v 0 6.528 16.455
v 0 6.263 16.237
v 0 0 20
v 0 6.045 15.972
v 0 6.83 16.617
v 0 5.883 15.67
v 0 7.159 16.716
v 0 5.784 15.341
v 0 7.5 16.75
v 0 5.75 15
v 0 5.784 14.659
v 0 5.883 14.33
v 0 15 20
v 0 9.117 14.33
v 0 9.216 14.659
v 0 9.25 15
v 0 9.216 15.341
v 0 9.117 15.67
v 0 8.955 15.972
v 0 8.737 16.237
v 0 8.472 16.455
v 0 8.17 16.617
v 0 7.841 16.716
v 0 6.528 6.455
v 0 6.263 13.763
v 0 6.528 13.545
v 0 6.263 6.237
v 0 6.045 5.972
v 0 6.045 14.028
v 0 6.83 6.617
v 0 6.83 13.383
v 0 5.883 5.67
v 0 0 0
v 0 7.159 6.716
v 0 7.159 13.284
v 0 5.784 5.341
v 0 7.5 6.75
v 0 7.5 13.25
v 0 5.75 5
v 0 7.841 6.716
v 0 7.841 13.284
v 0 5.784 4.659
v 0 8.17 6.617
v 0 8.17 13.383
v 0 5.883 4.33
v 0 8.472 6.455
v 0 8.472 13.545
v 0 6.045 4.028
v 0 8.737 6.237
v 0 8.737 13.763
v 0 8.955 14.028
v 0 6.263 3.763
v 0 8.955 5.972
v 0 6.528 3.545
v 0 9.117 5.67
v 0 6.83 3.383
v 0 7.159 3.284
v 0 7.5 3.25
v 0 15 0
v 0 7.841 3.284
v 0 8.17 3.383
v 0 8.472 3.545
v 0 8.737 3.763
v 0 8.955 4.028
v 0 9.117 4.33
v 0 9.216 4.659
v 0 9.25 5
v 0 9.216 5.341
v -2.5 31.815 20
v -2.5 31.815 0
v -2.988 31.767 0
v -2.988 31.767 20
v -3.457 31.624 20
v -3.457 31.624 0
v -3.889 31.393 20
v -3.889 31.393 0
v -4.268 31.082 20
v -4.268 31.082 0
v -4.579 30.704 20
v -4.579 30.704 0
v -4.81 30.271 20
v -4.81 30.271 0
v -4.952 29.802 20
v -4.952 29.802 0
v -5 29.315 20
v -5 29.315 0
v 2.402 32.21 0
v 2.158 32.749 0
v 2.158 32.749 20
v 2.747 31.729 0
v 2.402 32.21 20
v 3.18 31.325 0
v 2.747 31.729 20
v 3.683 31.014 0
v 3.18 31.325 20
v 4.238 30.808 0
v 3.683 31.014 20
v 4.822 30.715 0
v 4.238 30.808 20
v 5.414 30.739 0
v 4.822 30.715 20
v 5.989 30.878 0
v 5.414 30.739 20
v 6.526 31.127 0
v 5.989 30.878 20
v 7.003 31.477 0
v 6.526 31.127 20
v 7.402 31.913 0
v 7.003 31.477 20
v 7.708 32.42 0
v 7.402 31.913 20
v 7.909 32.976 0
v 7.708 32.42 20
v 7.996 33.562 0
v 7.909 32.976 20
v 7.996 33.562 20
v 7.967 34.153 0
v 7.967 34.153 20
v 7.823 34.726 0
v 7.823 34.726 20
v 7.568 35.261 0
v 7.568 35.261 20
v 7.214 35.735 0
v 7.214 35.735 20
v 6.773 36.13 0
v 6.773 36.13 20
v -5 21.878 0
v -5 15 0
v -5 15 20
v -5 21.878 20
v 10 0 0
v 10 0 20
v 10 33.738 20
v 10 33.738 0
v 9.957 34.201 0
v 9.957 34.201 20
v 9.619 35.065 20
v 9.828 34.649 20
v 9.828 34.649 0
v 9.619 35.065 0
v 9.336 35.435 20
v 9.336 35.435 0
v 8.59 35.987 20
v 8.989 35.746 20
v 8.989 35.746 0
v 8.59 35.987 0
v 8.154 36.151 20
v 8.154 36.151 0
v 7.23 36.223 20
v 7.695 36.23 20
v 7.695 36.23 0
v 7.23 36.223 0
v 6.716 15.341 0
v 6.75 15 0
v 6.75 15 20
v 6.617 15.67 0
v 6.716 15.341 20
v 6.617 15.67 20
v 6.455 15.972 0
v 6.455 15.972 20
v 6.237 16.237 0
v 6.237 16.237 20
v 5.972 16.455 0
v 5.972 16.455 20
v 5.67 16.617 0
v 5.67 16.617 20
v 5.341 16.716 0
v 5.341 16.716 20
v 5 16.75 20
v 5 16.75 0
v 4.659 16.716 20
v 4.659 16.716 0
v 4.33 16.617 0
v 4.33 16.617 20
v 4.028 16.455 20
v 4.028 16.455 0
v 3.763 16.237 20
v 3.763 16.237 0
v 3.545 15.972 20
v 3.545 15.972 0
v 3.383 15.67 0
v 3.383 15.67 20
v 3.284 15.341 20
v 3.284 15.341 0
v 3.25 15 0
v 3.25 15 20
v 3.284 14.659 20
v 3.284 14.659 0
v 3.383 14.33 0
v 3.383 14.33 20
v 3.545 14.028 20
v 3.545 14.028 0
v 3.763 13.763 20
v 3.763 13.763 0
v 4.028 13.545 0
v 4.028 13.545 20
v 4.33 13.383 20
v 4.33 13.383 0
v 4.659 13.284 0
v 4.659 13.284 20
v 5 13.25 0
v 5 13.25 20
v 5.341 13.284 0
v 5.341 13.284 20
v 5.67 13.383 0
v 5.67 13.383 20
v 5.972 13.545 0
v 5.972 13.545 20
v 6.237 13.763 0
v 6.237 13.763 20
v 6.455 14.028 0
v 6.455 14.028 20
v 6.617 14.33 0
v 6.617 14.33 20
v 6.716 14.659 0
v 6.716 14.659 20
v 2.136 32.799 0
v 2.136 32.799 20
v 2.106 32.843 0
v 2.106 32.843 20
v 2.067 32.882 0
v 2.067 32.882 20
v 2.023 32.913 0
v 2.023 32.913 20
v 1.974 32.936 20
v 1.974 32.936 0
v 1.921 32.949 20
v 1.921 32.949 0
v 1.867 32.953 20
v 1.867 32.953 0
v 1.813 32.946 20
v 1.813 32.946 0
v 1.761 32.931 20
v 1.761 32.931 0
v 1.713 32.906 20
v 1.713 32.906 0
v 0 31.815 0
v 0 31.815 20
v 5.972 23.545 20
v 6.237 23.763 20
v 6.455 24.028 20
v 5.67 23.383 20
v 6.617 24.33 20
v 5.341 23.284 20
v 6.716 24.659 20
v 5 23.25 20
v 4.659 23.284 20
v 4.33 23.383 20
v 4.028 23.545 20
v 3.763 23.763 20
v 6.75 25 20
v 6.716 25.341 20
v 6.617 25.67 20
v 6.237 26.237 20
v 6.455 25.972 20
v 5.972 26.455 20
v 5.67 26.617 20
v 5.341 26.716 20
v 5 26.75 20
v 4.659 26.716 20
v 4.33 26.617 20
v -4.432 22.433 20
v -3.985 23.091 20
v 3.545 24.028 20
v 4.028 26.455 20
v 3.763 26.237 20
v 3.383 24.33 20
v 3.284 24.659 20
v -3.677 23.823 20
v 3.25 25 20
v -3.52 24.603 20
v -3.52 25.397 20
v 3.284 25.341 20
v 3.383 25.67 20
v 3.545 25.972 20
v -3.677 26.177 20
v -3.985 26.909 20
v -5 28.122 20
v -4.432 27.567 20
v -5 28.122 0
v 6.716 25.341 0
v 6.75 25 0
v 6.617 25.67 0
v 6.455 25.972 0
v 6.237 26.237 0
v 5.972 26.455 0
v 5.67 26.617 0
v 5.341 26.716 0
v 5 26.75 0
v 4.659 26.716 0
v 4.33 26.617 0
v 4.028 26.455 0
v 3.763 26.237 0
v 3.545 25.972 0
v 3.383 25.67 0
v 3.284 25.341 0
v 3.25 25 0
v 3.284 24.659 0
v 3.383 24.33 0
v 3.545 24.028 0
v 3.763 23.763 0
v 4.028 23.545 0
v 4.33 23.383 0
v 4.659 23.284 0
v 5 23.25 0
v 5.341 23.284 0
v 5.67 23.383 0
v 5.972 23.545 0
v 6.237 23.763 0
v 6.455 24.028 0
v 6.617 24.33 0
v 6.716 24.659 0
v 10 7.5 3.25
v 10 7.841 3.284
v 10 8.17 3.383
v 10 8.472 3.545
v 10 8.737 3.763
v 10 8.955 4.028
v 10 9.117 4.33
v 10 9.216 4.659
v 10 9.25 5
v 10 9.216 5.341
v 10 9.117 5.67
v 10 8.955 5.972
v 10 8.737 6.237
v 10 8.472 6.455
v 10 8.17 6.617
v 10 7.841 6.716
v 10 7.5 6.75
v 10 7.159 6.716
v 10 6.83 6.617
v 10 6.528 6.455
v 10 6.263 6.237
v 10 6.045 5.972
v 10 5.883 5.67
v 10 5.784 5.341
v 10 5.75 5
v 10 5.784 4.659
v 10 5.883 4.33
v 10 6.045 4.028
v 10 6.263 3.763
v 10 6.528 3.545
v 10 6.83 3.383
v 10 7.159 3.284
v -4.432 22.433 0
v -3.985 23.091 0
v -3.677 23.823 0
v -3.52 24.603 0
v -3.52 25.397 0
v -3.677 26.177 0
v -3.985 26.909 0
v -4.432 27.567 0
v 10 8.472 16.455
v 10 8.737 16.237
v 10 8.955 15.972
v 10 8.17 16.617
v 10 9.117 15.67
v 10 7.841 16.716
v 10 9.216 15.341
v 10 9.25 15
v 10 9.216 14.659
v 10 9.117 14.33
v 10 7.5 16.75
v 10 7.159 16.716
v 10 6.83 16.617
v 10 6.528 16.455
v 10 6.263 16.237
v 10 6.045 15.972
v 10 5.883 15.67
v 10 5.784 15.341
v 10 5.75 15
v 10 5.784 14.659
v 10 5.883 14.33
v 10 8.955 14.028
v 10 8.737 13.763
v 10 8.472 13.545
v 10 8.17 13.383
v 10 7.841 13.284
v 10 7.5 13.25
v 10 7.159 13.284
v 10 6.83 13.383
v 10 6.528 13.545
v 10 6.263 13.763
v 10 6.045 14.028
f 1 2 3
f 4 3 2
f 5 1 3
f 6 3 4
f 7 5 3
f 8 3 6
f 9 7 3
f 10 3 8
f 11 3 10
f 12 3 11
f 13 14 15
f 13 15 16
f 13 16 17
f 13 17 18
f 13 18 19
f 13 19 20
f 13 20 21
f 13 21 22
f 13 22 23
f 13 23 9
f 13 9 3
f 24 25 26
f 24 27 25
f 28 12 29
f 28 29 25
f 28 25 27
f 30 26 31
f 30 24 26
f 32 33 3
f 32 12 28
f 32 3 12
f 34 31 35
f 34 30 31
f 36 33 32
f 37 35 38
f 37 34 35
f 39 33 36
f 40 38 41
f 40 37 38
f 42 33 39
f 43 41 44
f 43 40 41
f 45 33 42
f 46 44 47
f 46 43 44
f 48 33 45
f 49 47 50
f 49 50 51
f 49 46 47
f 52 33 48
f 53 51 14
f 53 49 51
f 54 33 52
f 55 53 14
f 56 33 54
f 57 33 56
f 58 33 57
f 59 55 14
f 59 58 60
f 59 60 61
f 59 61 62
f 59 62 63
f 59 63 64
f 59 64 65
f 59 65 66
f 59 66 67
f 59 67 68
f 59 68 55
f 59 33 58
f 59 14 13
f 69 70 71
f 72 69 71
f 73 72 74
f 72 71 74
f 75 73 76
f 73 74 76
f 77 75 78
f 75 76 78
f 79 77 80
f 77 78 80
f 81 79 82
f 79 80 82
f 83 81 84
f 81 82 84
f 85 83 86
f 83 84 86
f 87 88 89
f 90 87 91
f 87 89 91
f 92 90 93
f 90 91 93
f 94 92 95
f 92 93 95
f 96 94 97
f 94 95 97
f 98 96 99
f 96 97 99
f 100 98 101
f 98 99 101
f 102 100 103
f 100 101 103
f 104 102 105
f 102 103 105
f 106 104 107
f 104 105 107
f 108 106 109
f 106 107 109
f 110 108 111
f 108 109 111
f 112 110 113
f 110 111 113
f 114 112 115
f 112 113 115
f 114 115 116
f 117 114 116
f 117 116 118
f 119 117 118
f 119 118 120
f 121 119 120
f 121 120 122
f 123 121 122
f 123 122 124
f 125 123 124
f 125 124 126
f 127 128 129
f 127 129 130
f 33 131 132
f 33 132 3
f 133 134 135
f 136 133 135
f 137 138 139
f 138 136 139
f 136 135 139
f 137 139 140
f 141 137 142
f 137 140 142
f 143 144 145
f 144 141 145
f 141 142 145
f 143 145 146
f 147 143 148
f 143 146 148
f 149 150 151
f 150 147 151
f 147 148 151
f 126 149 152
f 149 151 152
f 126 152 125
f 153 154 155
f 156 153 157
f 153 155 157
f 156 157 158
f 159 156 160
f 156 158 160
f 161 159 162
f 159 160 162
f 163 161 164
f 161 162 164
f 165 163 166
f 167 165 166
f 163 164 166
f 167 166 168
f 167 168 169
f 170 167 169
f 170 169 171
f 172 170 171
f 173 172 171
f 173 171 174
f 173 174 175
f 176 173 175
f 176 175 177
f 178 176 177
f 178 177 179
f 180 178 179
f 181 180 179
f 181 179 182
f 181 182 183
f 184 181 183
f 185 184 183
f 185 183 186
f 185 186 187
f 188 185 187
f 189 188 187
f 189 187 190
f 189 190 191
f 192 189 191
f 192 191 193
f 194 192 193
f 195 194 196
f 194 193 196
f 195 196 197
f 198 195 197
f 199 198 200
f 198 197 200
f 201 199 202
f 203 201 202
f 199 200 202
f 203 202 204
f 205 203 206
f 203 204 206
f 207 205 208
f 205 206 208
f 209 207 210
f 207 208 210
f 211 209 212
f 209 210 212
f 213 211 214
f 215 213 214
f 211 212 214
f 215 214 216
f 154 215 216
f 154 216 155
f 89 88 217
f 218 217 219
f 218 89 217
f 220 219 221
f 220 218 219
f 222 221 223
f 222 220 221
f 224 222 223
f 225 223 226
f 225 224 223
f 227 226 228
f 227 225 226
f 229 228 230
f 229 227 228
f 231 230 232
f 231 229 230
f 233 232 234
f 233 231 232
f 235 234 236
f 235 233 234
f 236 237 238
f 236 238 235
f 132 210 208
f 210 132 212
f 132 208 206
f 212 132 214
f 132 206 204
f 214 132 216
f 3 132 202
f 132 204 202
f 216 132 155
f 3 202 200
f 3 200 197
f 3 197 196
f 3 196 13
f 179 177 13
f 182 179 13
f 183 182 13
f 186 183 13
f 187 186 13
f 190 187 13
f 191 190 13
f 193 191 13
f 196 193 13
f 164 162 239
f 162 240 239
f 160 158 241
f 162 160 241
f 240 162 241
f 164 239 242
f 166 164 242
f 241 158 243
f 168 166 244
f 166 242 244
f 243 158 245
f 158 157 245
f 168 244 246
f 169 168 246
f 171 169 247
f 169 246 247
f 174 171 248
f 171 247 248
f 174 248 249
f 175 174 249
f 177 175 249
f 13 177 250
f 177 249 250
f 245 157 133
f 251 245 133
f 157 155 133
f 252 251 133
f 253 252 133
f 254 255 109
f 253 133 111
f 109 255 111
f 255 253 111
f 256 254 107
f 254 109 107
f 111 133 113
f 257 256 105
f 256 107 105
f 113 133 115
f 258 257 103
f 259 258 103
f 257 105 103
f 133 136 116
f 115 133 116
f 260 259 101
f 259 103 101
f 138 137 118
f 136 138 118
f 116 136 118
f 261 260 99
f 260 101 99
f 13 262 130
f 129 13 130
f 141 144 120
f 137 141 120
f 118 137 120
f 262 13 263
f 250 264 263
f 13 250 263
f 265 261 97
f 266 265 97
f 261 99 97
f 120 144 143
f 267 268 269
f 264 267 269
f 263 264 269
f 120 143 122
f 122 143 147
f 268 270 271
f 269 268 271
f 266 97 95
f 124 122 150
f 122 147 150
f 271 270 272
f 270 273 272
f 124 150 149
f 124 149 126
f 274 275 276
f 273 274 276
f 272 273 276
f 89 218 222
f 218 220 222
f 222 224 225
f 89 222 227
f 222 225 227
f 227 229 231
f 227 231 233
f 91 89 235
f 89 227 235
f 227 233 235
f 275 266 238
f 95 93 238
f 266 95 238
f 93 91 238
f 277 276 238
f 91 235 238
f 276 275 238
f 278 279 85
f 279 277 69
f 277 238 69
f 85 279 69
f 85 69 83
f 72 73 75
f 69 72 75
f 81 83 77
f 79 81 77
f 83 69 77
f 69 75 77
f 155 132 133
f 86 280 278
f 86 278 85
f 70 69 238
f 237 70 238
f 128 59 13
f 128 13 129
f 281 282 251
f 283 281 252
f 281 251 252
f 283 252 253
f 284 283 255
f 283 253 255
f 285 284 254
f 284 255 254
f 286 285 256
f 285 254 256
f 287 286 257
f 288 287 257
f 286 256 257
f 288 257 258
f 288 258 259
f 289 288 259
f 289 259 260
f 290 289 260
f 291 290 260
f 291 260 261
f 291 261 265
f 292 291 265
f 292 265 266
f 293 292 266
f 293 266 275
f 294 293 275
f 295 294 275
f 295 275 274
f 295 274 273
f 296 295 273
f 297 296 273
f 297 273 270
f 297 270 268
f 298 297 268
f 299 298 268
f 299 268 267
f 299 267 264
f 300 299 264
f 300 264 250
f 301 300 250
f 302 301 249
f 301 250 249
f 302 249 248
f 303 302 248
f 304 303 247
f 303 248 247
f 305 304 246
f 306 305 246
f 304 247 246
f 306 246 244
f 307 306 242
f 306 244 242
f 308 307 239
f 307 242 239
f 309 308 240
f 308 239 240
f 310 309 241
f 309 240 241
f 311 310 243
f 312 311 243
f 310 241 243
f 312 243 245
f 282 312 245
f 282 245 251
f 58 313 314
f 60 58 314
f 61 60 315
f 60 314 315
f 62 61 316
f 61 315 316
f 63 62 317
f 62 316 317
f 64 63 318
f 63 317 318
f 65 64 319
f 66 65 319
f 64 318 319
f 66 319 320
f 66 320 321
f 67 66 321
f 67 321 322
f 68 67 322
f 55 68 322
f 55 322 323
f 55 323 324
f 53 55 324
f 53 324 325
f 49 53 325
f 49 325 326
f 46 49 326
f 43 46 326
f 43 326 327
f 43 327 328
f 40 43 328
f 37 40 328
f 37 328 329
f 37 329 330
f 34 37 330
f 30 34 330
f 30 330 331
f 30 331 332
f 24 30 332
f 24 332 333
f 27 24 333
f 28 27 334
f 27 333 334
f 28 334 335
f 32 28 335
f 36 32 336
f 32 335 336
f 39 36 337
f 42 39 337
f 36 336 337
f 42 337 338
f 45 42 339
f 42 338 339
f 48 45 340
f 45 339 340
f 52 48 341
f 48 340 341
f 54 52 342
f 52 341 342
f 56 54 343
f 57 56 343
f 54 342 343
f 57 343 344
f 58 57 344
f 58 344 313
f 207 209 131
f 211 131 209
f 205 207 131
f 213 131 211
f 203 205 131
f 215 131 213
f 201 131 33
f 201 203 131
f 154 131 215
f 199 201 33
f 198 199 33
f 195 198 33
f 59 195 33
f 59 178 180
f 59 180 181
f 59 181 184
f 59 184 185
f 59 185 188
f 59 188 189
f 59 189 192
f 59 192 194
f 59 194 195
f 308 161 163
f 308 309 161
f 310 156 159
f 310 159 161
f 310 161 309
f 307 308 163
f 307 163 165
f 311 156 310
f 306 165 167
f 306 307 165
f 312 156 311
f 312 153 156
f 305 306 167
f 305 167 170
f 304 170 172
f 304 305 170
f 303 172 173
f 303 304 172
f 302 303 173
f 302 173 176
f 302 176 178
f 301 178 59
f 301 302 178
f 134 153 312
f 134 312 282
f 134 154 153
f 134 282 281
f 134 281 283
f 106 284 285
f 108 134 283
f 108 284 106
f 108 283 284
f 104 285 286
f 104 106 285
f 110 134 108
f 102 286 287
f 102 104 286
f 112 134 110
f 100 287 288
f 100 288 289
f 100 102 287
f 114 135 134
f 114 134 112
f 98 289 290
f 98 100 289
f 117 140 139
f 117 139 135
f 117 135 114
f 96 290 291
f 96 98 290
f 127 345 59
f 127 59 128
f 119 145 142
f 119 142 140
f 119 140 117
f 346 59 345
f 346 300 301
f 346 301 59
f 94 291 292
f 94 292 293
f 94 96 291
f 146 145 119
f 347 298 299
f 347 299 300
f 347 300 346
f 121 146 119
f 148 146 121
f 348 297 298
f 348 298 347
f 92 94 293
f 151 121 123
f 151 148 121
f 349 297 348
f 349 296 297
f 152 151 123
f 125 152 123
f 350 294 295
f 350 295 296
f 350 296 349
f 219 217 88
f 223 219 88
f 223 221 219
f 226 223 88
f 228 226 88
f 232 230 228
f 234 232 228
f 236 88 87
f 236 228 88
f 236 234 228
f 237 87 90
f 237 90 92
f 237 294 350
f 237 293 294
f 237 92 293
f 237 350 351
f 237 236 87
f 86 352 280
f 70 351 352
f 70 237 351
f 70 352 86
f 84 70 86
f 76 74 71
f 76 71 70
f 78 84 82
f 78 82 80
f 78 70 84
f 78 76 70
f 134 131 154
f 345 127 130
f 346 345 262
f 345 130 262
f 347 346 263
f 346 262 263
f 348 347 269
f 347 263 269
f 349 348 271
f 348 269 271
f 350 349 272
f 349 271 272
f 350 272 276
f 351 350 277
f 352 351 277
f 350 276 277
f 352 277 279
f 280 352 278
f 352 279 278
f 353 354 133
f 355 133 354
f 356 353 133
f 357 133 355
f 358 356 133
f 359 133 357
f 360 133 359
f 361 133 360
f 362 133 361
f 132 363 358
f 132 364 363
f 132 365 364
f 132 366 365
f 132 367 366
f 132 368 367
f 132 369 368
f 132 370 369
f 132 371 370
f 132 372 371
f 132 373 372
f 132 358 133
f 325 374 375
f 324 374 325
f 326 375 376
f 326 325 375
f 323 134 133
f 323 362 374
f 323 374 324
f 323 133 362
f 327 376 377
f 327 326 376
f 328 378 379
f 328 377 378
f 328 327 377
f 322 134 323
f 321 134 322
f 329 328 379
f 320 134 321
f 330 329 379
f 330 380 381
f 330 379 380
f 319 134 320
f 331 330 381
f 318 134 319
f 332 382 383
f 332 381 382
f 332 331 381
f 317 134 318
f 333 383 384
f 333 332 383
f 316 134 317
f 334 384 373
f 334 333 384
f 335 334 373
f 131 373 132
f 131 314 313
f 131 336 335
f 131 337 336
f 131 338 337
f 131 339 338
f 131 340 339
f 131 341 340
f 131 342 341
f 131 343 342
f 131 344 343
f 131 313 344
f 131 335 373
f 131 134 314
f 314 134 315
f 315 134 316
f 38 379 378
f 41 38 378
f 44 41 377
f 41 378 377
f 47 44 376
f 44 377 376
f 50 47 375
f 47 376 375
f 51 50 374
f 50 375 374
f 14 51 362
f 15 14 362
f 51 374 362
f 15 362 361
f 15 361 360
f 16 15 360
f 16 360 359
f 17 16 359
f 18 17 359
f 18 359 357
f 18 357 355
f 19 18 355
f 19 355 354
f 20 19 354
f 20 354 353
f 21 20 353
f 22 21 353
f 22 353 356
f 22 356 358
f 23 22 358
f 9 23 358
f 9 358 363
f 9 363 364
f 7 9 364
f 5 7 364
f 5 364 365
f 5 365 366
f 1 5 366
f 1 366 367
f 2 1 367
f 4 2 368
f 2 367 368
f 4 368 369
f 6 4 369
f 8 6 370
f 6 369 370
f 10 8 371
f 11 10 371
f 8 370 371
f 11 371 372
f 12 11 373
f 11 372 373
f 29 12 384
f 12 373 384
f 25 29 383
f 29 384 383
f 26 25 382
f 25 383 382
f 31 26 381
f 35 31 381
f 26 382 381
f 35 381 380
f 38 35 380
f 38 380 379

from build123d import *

# Parameters (mm, degrees)
BOSS_EXTRUDE1_DEPTH = 20
SKETCH3_R           = 1.75
CUT_EXTRUDE1_DEPTH  = 46.641220998
SKETCH4_R           = 3
SKETCH4_R_2         = 1.75
SKETCH4_R_3         = 4
CUT_EXTRUDE2_DEPTH  = 45.250661625
FILLET2_R           = 2.5
FILLET3_R           = 0.3


with BuildPart() as part:
    # Sketch2 → Boss-Extrude1 (new body)
    with BuildSketch(Plane.XY):
        Polygon((0, 0), (0, 15), (-5, 15), (-5, 31.814648696), (0, 31.814648696), (10, 38.185351304), (10, 0), align=None)
    extrude(amount=BOSS_EXTRUDE1_DEPTH)

    # Sketch3 → Cut-Extrude1 (cut, through all)
    with BuildSketch(Plane(origin=(10, 0, 0), x_dir=(0, 0, -1), z_dir=(1, 0, 0))):
        with Locations((-15, 7.5)):
            Circle(SKETCH3_R)
        with Locations((-5, 7.5)):
            Circle(SKETCH3_R)
    extrude(amount=-CUT_EXTRUDE1_DEPTH, mode=Mode.SUBTRACT)

    # Sketch4 → Cut-Extrude2 (cut, through all)
    with BuildSketch(Plane.XY.offset(20)):
        with Locations((5, 33.71)):
            Circle(SKETCH4_R)
        with Locations((5, 25)):
            Circle(SKETCH4_R_2)
        with Locations((-7.5, 25)):
            Circle(SKETCH4_R_3)
        with Locations((5, 15)):
            Circle(SKETCH4_R_2)
    extrude(amount=-CUT_EXTRUDE2_DEPTH, mode=Mode.SUBTRACT)

    # Fillet2
    # the kernel refuses this fillet: 2.5 mm, written as the material it takes off along each edge
    with BuildSketch(Plane(origin=(10, 38.185351304, -11.119166033), x_dir=(0, -1, 0), z_dir=(0, 0, 1))) as fillet2_piece_1:
        with BuildLine():
            CenterArc((4.447666413, -2.5), FILLET2_R, 90, 106.897304497)
            Line((2.055598265, -3.226642949), (2.007756902, -3.241175808))
            ThreePointArc((2.007756902, -3.241175808), (0.98562956, -1.640186455), (-0.042169572, -0.02686498))
            Line((-0.042169572, -0.02686498), (0, 0.05))
            Line((0, 0.05), (4.447666413, 0.05))
            Line((4.447666413, 0.05), (4.447666413, 0))
        make_face()
    extrude(amount=42.238332065, mode=Mode.SUBTRACT)
    with BuildSketch(Plane(origin=(-5, 31.814648696, -6.25), x_dir=(1, 0, 0), z_dir=(0, 0, 1))) as fillet2_piece_2:
        with BuildLine():
            CenterArc((FILLET2_R, -FILLET2_R), FILLET2_R, 90, 90)
            Line((0, -FILLET2_R), (-FILLET2_R * 0.02, -FILLET2_R))
            Line((-FILLET2_R * 0.02, -FILLET2_R), (-FILLET2_R * 0.02, FILLET2_R * 0.02))
            Line((-FILLET2_R * 0.02, FILLET2_R * 0.02), (FILLET2_R, FILLET2_R * 0.02))
            Line((FILLET2_R, FILLET2_R * 0.02), (FILLET2_R, 0))
        make_face()
    extrude(amount=32.5, mode=Mode.SUBTRACT)

    # Fillet3
    fillet3_edges = [part.edges().sort_by_distance(p)[0] for p in [
        (2.057505904, 33.125424519, 10),
    ]]
    fillet(fillet3_edges, radius=FILLET3_R)


solid = part.part
